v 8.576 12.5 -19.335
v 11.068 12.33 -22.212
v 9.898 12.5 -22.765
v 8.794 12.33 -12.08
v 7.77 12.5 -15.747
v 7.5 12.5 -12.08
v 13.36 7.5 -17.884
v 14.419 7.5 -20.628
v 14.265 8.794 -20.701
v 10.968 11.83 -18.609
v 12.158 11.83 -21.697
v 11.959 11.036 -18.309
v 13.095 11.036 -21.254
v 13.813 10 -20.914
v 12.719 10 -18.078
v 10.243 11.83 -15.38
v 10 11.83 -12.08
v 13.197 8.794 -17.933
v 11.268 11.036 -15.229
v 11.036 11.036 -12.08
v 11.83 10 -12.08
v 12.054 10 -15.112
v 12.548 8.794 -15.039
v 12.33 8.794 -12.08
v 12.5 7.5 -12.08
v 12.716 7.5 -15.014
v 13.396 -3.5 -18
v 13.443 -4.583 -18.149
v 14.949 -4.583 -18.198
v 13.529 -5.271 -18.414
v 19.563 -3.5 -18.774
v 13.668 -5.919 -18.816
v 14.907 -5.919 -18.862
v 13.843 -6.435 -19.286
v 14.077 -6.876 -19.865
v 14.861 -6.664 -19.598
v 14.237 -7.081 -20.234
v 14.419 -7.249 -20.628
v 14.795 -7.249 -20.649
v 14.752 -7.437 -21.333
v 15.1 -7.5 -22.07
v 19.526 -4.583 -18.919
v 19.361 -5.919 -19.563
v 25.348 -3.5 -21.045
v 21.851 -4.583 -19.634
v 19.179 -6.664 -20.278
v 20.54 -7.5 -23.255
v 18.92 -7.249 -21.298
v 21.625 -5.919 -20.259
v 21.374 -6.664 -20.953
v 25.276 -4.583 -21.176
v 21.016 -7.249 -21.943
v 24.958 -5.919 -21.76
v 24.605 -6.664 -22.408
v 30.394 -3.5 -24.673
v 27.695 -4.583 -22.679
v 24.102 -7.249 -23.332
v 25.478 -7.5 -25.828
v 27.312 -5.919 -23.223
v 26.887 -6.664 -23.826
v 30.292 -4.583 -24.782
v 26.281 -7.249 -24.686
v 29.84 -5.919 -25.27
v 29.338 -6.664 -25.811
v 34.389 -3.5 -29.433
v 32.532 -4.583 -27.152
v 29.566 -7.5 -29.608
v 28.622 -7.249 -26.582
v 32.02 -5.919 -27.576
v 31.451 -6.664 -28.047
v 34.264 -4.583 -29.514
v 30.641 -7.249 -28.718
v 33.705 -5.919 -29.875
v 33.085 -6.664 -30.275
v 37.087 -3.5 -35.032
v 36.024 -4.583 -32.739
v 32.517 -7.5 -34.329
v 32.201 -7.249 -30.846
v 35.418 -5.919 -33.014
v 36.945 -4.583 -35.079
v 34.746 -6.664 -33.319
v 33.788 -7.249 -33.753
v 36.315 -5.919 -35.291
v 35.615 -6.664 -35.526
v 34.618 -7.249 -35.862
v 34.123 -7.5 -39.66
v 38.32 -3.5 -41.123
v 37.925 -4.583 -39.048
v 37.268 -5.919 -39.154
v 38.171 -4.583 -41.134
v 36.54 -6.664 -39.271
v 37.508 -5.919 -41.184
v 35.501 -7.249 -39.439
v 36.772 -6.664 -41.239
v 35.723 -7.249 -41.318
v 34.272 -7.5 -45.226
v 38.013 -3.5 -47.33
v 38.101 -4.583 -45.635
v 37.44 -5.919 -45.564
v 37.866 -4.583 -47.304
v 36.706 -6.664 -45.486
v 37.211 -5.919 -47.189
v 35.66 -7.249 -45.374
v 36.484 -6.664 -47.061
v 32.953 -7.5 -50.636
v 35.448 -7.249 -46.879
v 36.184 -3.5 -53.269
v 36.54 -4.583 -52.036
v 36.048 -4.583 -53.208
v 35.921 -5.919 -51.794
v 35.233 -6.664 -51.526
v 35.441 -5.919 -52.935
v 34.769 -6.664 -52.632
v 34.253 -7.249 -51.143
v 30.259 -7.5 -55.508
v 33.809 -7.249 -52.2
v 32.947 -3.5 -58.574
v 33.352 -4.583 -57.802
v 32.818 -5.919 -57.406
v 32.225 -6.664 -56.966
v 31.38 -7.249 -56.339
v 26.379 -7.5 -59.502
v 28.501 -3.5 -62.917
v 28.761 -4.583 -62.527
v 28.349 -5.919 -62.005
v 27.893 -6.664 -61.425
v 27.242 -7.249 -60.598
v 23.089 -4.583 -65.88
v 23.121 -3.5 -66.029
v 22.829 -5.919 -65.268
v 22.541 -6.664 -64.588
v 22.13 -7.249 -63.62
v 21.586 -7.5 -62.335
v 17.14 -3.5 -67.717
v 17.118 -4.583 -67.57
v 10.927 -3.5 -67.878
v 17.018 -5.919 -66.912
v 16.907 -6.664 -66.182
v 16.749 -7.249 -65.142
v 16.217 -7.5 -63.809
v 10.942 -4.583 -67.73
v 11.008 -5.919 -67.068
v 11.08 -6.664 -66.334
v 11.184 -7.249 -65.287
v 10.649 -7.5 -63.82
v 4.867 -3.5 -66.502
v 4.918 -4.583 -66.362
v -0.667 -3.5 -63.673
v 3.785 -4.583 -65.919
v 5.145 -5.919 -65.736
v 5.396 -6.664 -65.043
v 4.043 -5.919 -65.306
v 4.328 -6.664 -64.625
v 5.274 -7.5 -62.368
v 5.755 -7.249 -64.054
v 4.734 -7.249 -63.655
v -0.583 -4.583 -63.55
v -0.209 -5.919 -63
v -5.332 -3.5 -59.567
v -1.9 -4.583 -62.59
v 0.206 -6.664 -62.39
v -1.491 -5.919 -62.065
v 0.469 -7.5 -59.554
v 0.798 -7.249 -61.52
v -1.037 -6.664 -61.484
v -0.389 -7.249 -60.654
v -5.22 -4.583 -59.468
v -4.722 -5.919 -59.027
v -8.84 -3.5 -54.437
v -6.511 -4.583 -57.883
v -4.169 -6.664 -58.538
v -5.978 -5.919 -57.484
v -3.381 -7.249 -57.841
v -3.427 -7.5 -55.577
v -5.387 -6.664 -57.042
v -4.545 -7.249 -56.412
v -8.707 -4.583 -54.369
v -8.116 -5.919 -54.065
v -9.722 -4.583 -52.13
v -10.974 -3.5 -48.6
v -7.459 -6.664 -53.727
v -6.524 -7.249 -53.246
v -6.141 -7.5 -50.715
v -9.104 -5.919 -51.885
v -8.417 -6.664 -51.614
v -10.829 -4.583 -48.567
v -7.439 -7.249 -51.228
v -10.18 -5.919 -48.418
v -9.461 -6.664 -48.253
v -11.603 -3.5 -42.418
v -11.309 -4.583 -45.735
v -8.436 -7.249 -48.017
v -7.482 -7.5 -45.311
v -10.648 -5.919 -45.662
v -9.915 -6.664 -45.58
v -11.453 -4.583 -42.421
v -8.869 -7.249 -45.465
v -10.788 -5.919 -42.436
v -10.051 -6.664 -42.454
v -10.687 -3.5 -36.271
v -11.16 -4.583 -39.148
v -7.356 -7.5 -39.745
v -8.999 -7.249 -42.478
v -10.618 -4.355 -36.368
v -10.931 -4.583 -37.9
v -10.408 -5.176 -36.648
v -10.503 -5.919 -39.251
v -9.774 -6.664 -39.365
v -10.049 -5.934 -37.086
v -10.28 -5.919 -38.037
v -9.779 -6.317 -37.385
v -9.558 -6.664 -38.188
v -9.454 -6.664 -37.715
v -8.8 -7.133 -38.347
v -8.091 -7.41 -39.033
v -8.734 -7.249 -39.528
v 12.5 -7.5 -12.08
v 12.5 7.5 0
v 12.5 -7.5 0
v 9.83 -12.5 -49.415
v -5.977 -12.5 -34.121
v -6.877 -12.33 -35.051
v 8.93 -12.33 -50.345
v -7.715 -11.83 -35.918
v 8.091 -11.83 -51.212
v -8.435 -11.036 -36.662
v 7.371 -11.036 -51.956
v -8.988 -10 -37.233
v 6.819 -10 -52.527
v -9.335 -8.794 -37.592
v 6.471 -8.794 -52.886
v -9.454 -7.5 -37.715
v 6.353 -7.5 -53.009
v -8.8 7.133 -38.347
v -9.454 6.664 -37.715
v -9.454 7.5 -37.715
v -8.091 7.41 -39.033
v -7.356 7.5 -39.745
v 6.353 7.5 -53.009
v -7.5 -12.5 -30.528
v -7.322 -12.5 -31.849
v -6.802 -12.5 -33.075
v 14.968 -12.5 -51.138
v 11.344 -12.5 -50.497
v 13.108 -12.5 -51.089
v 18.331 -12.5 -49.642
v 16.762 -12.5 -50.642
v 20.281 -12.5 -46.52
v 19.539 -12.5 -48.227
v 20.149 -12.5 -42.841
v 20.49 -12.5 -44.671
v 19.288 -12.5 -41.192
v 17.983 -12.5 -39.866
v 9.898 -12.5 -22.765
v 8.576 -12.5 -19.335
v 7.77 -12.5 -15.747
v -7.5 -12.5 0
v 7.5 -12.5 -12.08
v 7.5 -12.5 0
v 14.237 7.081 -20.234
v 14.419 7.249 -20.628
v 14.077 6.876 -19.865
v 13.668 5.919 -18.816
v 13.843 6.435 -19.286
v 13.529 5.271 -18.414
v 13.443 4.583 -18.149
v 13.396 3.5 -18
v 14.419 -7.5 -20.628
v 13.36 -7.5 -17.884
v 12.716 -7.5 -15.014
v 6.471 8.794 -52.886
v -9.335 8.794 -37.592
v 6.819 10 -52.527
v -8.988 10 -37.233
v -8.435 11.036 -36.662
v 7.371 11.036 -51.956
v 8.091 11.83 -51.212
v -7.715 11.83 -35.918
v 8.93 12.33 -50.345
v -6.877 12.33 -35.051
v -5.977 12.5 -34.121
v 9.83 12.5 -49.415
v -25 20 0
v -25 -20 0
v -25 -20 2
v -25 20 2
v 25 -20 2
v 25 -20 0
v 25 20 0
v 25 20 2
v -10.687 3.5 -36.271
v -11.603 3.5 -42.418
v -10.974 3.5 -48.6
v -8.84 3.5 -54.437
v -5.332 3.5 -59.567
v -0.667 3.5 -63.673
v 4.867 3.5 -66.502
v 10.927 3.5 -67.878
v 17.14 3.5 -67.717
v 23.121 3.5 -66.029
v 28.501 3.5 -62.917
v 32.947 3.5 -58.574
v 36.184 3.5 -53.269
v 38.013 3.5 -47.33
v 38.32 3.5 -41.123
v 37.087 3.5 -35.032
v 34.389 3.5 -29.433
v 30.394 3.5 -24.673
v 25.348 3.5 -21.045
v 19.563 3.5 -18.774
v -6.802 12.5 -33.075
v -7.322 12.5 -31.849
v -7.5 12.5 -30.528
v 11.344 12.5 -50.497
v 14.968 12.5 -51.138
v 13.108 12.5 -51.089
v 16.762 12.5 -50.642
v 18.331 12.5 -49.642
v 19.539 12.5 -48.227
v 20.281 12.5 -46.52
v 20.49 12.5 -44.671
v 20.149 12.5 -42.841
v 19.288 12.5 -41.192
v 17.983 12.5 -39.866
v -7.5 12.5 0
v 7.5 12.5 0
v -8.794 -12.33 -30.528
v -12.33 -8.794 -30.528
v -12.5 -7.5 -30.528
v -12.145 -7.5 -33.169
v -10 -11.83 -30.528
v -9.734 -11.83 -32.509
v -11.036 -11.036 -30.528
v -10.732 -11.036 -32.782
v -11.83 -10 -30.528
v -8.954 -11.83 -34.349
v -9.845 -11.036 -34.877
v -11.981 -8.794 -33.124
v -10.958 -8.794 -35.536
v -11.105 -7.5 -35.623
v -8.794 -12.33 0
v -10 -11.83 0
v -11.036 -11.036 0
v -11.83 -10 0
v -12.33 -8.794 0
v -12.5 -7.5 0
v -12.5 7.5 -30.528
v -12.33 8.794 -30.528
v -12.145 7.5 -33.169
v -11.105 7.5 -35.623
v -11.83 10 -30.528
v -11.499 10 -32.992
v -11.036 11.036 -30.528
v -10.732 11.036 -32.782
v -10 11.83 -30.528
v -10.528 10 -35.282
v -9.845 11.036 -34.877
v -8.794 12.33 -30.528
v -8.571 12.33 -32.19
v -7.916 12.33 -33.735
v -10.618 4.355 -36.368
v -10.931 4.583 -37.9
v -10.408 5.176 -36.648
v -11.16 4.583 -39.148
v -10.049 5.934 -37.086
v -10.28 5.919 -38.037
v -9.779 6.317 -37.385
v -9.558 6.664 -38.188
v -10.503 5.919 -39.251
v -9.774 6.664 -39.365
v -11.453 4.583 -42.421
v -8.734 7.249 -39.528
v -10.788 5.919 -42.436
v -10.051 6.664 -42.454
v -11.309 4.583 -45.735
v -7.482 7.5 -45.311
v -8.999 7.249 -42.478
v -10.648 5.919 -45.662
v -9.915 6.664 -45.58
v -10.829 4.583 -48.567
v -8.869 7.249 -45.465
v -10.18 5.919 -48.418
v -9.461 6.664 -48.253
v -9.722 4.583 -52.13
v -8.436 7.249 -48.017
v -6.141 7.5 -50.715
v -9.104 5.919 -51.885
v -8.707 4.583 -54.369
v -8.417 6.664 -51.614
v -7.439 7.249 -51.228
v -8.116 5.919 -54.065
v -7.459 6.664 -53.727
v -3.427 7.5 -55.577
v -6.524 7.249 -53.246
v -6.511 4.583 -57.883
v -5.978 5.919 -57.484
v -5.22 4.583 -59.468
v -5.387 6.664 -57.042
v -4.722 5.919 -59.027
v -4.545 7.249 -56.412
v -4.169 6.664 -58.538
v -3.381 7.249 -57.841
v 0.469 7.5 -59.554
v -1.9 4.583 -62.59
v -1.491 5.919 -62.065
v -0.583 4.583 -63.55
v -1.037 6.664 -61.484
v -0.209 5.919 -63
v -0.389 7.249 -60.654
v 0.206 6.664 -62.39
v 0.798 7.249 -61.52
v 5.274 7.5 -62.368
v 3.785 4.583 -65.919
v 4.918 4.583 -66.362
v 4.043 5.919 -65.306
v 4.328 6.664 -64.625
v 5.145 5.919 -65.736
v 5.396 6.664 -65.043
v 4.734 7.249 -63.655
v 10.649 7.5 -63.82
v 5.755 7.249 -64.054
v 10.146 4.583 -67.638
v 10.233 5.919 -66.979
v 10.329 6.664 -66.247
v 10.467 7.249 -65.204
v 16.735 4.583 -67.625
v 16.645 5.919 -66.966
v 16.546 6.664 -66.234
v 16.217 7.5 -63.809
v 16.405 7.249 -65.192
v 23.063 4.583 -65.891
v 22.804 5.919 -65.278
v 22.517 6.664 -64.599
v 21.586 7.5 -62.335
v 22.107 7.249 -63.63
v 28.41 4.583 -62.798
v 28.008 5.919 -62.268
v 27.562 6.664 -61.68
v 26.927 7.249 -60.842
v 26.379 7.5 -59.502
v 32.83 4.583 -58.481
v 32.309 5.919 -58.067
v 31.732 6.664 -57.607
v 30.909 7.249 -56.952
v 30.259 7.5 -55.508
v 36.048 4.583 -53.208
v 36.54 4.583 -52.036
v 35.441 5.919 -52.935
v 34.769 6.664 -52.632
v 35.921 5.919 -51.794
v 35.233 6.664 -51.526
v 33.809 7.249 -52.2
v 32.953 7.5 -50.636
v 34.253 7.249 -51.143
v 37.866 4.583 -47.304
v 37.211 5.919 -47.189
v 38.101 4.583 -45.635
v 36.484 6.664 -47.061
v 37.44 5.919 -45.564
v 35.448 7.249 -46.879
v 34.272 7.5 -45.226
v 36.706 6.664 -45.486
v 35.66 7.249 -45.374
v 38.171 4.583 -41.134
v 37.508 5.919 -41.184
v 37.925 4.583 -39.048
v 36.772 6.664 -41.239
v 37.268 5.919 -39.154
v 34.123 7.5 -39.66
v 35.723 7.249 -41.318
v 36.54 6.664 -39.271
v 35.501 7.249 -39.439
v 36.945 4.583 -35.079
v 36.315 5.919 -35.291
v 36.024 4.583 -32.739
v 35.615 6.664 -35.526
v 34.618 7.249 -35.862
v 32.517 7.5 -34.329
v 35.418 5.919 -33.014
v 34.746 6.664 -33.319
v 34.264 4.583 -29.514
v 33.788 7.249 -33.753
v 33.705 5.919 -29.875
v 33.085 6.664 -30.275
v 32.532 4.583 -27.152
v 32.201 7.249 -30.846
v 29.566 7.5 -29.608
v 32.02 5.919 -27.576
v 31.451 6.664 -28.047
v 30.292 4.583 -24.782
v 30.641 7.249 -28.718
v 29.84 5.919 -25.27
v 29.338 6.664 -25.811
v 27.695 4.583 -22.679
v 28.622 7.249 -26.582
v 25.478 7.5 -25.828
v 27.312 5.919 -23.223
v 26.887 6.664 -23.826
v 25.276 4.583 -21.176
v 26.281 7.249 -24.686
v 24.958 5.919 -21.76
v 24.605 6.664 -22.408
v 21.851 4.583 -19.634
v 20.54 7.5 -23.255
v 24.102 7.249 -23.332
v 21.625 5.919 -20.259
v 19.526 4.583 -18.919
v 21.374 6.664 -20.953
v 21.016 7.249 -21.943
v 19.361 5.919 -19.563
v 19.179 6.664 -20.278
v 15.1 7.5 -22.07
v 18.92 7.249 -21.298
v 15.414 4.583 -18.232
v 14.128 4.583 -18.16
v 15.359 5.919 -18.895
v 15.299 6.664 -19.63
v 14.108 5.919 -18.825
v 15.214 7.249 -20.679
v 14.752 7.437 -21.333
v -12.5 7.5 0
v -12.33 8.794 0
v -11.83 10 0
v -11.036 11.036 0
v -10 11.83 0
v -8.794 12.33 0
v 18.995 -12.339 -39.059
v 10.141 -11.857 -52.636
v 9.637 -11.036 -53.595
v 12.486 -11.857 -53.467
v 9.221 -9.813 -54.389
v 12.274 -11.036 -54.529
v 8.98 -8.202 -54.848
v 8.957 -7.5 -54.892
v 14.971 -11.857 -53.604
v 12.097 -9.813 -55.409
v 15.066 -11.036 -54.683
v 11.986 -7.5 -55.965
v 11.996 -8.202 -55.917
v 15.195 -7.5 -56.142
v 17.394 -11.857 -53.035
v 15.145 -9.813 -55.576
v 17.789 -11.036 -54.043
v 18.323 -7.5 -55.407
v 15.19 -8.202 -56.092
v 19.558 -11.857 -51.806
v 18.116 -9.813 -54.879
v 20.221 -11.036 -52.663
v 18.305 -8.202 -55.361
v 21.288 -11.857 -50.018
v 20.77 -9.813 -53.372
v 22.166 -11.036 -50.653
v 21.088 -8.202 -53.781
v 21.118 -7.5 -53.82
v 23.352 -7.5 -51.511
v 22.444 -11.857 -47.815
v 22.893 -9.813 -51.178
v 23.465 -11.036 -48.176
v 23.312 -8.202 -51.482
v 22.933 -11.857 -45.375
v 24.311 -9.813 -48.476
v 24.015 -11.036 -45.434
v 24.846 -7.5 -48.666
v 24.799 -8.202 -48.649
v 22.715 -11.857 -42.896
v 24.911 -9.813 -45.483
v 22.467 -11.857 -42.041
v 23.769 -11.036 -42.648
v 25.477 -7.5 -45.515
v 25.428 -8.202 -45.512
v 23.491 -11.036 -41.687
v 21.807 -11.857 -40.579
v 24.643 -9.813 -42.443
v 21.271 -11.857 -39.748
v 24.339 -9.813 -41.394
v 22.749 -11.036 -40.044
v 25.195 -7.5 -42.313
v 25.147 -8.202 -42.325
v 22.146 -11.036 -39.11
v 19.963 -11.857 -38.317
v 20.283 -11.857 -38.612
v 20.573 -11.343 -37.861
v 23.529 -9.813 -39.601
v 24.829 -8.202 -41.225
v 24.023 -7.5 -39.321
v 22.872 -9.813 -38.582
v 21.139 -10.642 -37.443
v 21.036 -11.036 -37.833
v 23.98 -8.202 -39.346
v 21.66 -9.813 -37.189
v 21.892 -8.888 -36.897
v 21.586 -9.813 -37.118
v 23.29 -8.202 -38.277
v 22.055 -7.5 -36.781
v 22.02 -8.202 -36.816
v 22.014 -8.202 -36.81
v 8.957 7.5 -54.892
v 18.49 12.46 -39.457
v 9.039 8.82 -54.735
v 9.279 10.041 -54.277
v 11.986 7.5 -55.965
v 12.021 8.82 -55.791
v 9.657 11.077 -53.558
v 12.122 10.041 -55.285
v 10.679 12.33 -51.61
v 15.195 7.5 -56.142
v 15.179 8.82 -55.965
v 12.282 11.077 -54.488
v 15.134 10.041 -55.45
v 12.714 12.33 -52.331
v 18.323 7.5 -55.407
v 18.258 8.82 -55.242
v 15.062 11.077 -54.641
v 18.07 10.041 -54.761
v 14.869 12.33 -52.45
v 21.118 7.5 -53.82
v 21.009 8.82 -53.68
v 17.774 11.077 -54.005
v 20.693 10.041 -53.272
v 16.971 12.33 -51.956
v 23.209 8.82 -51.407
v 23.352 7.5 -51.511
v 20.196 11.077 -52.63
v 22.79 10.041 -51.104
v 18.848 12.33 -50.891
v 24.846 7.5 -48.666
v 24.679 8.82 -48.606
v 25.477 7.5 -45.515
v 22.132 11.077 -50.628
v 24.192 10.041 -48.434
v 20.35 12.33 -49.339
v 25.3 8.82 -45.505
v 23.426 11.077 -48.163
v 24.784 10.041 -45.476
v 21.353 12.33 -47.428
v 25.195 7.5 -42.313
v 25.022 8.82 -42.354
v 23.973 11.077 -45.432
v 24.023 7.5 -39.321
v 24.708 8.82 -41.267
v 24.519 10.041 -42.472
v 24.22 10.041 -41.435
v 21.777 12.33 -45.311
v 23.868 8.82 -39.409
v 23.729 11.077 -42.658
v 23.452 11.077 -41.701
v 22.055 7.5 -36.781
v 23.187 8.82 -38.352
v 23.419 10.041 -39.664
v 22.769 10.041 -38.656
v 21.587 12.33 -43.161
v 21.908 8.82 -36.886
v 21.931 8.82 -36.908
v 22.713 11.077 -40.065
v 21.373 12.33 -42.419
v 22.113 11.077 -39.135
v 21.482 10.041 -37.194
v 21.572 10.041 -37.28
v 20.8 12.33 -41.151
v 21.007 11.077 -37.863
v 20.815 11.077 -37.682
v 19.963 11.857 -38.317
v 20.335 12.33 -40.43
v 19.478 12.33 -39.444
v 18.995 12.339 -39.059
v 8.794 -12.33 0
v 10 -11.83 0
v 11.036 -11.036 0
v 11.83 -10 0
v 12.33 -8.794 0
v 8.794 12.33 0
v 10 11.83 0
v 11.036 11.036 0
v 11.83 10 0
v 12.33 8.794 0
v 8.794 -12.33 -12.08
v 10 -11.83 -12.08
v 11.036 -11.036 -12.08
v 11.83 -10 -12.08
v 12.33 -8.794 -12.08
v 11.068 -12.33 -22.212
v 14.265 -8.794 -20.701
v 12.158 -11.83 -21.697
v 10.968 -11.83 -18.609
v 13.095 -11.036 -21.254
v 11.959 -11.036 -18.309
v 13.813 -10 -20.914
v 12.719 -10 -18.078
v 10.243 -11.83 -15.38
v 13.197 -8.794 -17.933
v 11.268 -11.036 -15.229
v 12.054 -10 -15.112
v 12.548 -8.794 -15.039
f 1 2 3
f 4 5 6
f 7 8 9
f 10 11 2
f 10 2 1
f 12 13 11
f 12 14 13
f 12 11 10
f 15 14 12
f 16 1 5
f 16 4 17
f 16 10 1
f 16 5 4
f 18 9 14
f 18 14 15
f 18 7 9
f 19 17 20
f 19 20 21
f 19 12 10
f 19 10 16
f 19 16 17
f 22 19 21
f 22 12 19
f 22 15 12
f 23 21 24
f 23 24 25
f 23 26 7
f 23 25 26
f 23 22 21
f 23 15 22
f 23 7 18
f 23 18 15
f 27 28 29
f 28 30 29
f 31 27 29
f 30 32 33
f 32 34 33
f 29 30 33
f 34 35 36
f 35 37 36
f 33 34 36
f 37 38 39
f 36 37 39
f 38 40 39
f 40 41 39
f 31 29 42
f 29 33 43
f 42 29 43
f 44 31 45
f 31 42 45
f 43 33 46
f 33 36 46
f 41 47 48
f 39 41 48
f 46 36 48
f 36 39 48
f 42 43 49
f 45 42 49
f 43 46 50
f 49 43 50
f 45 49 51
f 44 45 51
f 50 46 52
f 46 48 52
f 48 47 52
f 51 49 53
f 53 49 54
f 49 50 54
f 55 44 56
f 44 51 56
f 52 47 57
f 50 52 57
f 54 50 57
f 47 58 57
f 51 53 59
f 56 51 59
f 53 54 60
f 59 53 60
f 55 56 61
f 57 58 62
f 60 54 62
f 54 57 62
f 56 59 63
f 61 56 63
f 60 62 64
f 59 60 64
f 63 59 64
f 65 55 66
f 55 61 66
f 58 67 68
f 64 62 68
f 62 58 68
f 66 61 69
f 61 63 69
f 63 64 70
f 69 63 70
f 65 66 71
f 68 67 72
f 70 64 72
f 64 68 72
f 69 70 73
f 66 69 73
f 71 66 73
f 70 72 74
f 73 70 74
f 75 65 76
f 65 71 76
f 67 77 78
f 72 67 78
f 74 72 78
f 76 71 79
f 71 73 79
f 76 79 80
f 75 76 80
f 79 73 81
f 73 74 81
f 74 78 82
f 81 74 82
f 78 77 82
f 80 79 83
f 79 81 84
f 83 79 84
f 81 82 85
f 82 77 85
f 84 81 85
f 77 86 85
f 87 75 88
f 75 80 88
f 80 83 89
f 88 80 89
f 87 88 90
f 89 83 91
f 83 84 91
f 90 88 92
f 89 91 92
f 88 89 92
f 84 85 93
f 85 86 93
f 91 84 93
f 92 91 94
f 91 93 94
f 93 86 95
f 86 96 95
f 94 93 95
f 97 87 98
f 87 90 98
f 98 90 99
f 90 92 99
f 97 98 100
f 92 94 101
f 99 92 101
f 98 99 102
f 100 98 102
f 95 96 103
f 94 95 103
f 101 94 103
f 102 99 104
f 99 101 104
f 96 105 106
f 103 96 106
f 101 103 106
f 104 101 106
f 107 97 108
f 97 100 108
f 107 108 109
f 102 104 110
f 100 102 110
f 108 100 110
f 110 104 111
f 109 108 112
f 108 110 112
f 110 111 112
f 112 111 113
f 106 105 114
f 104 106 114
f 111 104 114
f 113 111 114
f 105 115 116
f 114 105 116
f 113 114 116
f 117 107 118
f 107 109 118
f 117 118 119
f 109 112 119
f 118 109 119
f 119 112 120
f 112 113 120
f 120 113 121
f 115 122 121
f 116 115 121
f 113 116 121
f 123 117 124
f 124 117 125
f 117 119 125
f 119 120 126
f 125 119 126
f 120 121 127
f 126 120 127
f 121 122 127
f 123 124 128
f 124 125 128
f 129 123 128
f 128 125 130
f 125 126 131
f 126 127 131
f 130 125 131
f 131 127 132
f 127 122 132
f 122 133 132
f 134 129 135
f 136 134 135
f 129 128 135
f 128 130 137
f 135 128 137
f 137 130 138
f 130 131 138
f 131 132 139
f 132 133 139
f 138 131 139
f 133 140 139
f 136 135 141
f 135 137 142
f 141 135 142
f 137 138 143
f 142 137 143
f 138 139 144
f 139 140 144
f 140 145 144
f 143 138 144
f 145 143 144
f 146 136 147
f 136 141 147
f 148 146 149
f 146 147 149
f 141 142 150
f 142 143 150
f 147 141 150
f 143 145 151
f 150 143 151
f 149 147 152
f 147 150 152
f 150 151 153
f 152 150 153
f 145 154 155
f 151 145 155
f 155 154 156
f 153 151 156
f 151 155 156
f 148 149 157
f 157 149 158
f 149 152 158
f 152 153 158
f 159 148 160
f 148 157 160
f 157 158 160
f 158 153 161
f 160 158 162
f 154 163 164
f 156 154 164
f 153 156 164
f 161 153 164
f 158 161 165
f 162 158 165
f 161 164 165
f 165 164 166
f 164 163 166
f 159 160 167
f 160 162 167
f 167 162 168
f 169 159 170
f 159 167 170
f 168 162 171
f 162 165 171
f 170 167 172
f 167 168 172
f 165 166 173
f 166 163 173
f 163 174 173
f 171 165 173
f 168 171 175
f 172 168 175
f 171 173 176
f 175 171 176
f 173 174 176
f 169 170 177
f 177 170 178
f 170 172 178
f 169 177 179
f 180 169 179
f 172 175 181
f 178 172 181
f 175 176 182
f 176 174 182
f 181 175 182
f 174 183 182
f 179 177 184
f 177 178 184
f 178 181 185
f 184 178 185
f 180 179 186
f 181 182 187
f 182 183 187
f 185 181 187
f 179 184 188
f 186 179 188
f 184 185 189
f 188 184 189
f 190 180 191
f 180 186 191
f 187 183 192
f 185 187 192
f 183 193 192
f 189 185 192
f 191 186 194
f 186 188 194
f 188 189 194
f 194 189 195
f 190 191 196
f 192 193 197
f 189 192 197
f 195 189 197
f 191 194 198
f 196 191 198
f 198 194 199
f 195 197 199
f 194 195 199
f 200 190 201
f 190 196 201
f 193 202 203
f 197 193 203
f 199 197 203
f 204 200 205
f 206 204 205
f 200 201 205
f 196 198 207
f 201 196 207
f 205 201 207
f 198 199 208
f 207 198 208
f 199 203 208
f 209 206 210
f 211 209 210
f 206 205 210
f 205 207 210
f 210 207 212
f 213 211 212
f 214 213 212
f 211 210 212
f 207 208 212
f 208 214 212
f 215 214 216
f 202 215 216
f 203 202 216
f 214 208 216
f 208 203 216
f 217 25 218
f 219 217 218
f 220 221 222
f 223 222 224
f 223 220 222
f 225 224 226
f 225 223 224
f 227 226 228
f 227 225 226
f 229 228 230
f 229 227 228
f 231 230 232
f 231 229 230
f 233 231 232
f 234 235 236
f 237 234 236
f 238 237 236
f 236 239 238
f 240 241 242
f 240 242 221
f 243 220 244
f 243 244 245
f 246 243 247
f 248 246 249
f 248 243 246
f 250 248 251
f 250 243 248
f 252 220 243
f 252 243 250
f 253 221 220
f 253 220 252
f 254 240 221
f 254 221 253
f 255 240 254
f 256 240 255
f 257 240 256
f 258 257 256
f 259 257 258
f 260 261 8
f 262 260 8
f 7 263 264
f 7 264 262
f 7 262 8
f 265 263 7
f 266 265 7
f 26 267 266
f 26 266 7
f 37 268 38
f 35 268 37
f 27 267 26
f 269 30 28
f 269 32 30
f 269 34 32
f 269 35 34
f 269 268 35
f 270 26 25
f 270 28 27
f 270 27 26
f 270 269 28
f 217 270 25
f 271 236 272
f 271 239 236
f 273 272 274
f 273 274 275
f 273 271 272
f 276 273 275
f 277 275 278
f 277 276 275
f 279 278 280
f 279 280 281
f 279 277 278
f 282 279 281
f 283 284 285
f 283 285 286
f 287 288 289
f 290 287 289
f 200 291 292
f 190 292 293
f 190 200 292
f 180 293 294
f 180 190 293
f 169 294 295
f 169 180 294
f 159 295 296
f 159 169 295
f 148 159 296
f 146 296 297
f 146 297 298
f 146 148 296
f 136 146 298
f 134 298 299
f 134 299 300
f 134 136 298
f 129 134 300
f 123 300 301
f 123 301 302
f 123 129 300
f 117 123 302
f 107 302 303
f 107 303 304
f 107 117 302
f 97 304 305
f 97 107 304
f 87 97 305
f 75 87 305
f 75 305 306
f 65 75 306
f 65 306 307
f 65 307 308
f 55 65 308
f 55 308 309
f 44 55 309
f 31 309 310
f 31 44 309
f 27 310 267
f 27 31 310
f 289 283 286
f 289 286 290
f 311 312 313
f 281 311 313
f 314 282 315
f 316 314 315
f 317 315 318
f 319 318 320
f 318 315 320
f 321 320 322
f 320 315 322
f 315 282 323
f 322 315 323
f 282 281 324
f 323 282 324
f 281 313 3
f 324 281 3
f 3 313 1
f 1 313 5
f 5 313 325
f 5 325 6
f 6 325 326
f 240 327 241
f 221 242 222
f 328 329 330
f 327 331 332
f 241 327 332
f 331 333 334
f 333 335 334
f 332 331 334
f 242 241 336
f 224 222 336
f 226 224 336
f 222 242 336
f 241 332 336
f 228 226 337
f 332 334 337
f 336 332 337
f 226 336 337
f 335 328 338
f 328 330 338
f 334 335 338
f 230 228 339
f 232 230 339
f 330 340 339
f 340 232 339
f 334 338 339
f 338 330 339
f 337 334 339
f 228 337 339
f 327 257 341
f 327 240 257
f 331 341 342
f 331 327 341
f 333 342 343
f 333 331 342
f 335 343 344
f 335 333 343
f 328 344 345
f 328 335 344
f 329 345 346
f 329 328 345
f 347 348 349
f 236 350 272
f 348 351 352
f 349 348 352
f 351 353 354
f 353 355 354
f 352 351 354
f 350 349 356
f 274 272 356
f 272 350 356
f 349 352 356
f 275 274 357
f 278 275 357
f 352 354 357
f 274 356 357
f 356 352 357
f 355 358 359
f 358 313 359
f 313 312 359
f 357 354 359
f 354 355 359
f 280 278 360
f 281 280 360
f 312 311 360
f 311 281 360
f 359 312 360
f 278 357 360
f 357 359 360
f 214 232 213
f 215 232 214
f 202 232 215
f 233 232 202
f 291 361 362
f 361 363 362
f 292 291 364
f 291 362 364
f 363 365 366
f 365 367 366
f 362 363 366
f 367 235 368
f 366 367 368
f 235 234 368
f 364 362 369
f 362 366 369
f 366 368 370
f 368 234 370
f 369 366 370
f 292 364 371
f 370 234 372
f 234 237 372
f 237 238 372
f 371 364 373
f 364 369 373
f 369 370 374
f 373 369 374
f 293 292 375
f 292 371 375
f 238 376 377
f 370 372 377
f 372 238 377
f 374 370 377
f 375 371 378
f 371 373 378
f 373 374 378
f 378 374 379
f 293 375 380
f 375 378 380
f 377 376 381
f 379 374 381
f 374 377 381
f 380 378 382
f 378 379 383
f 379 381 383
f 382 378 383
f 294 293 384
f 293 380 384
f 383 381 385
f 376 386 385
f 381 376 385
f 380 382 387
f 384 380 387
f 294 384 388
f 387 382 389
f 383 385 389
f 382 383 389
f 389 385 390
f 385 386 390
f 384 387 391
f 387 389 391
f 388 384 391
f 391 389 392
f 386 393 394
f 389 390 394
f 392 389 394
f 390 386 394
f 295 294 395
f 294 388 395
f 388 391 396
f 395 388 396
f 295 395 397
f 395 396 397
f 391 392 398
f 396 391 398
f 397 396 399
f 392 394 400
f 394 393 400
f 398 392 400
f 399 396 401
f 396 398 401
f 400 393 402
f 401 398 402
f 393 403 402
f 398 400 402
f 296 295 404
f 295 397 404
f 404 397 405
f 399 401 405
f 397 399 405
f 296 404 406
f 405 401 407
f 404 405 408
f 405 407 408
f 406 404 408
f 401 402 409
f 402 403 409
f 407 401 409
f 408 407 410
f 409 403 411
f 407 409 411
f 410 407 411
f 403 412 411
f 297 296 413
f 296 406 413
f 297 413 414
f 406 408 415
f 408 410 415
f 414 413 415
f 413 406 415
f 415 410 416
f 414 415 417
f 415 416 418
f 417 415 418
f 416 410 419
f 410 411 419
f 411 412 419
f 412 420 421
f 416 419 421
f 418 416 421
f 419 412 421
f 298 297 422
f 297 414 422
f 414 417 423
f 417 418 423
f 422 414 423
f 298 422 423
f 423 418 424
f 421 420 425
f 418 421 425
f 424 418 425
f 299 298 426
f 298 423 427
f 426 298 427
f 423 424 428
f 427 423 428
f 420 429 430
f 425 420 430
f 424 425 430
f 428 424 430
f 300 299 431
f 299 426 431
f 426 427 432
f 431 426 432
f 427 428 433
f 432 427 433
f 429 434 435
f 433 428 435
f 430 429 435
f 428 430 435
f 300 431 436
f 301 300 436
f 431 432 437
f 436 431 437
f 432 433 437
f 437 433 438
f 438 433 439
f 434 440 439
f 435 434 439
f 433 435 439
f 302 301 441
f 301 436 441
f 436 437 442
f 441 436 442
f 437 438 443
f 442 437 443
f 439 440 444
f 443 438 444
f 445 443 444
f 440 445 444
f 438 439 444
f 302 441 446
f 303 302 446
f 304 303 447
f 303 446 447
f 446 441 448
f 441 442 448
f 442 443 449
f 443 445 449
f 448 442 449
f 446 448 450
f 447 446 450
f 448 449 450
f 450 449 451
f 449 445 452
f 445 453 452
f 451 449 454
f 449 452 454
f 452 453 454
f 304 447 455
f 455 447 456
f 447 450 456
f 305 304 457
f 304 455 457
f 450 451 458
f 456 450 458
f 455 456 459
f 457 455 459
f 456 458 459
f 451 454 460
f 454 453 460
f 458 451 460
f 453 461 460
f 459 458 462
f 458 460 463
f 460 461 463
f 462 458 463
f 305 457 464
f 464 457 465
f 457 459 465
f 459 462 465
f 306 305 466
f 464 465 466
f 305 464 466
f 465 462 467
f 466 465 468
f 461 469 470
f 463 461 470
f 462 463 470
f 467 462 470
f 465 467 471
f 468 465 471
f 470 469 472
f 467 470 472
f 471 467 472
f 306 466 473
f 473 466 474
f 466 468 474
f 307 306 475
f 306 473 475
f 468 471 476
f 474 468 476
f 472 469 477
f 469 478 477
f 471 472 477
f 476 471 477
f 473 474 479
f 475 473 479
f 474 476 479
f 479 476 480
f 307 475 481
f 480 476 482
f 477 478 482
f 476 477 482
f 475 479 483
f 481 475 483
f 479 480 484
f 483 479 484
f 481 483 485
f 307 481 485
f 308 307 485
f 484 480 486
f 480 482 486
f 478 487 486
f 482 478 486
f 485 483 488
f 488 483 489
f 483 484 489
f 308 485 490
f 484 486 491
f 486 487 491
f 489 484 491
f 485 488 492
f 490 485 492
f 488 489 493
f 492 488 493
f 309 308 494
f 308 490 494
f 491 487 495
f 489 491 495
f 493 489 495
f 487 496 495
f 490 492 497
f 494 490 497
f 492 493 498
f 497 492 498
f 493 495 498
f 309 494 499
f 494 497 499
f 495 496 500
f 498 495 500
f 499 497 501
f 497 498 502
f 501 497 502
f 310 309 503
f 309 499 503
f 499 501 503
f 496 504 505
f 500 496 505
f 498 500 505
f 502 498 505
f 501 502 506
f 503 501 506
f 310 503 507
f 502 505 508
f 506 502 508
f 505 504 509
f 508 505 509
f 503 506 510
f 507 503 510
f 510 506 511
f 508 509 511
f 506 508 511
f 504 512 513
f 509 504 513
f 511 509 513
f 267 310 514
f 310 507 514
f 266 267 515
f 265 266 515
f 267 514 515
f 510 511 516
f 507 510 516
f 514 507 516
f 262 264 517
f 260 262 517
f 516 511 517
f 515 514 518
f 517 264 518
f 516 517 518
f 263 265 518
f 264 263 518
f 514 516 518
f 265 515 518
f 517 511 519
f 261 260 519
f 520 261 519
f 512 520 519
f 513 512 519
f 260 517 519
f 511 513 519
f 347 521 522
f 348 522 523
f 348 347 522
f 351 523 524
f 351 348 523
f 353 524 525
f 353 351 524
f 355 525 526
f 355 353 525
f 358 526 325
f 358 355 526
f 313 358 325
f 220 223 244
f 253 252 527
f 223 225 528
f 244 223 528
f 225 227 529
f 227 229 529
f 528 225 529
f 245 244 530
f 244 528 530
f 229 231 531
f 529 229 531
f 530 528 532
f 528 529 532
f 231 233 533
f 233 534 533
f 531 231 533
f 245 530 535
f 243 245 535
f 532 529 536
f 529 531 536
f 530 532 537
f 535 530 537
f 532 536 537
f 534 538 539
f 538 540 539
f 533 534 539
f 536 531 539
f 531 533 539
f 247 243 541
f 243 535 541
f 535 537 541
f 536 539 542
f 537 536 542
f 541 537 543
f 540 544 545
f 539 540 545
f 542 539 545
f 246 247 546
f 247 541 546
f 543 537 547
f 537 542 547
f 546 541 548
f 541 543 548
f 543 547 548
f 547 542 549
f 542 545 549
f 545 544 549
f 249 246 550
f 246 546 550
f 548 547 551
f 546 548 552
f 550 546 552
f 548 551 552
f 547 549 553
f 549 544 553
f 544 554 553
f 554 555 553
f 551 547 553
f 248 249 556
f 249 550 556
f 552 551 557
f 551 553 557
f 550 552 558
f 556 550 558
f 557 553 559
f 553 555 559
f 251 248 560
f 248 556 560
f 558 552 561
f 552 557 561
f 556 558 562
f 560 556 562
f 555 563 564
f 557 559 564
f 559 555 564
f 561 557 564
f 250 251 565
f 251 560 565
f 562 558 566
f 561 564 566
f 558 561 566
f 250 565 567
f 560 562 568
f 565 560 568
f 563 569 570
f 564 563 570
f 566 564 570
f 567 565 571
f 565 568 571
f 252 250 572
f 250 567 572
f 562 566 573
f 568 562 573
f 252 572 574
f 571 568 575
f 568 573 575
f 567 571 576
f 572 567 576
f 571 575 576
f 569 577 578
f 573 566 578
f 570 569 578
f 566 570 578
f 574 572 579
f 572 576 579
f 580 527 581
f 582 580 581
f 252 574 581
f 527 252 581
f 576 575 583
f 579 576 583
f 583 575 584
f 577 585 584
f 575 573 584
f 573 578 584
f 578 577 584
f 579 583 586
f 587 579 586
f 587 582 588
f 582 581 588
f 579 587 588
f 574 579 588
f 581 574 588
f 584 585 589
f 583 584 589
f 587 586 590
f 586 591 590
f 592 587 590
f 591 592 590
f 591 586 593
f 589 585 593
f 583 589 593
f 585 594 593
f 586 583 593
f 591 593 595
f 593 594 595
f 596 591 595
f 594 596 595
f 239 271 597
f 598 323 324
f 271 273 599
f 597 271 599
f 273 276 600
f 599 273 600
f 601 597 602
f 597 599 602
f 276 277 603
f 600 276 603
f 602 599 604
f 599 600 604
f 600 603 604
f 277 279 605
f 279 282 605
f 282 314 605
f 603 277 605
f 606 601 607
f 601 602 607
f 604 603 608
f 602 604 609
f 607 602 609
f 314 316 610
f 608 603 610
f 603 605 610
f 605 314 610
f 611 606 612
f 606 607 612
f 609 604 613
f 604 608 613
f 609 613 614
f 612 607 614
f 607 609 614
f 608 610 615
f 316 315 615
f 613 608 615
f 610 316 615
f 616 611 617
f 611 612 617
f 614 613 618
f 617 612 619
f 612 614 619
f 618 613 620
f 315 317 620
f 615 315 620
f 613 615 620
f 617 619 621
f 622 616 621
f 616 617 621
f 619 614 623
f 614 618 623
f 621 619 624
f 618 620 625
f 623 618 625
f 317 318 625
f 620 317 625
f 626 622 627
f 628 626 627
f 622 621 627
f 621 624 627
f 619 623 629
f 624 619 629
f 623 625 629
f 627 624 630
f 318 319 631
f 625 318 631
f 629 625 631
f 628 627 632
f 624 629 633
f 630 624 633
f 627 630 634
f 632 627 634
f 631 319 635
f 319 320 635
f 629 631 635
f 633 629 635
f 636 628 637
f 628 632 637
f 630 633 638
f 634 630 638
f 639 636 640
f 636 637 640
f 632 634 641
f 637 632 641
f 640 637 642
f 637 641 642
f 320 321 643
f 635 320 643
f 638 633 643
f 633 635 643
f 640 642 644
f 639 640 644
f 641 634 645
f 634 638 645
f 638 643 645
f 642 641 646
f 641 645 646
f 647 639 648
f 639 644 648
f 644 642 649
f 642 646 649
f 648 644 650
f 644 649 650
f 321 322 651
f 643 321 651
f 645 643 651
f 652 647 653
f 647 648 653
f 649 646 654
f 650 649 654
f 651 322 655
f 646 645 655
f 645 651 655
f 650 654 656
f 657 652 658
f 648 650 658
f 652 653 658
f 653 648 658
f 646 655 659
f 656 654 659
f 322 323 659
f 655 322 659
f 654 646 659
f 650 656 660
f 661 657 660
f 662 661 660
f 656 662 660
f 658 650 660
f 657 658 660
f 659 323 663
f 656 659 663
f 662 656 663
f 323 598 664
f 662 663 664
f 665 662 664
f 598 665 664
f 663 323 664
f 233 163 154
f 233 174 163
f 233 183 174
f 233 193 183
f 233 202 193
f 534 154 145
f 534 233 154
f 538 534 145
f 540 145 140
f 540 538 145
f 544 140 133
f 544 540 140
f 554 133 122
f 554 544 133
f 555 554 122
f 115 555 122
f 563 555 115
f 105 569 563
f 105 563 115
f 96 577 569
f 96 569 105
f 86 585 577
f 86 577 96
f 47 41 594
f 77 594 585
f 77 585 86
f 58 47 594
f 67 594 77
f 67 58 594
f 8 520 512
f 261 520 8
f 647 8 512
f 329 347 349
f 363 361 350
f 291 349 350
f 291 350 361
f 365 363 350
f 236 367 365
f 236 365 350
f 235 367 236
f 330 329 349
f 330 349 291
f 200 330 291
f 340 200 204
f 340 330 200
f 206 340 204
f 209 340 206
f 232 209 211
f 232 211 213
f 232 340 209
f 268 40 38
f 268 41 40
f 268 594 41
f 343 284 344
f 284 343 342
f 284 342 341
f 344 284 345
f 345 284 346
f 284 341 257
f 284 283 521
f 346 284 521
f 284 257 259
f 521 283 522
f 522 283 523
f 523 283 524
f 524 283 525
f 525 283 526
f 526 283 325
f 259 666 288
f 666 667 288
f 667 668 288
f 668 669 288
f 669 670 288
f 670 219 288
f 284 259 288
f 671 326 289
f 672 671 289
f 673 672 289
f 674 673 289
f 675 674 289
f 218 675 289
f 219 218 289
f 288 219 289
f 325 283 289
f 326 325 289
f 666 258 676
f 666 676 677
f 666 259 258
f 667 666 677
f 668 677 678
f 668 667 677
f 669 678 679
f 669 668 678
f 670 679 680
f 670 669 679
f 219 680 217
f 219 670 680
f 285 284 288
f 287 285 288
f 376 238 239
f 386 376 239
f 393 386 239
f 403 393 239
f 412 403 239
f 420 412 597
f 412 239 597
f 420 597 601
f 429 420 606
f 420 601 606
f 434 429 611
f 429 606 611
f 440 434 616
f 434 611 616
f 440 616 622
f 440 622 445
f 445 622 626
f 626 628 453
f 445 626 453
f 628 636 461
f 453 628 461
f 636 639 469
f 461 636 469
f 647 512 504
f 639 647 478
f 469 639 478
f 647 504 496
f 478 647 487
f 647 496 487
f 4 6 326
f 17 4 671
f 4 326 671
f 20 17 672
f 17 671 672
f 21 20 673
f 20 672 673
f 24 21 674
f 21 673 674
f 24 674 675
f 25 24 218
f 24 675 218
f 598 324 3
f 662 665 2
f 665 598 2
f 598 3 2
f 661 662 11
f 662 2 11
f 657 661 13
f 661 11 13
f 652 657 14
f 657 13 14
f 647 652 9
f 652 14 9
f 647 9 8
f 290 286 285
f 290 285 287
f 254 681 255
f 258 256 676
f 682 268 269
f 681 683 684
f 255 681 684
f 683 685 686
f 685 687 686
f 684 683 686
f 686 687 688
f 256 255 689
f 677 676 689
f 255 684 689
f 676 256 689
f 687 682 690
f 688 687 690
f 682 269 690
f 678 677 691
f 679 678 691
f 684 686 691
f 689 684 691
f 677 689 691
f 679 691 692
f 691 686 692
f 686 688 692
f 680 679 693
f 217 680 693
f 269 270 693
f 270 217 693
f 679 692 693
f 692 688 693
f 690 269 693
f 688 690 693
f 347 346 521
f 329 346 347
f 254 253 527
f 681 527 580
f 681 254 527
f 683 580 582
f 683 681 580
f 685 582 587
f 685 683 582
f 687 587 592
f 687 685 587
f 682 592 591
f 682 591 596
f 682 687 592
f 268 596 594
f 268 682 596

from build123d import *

# Parameters (mm, degrees)
F0_W     = 50
F0_H     = 40
F1_DEPTH = 2
F3_DEPTH = 12.5
F4_R     = 25
F5_DEPTH = 7.5
F6_R     = 4
F7_R     = 4.99999


# Not quite as in the source:
# - a fillet or chamfer is up to 0.001 mm smaller than in the source, because OpenCascade refuses the exact size


with BuildPart() as f1:
    # F0 (on Top) → F1 (new body)
    with BuildSketch(Plane.XY):
        Rectangle(F0_W, F0_H)
    extrude(amount=F1_DEPTH)

    # F2 (on Front) → F3 (join, symmetric)
    with BuildSketch(Plane.XZ):
        with BuildLine():
            Line((12.5, 0), (-12.5, 0))
            Line((-12.5, 0), (-12.5, -30.5279912201))
            ThreePointArc((-12.5, -30.5279912201), (-11.7069556163, -34.43080665), (-9.4536063441, -37.7146009084))
            Line((-9.4536063441, -37.7146009084), (6.3529476633, -53.0086768346))
            ThreePointArc((6.3529476633, -53.0086768346), (22.3177107814, -52.745608492), (22.0546424389, -36.7808453739))
            Line((22.0546424389, -36.7808453739), (14.4186308033, -20.6281161927))
            ThreePointArc((14.4186308033, -20.6281161927), (12.9855517125, -16.4605806119), (12.5, -12.0803628053))
            Line((12.5, -12.0803628053), (12.5, 0))
        make_face()
    extrude(amount=F3_DEPTH, both=True)

    # F4 (on Front) → F5 (join, symmetric)
    with BuildSketch(Plane.XZ):
        with Locations((13.390565291, -43)):
            Circle(F4_R)
    extrude(amount=F5_DEPTH, both=True)

    # F6
    f6_edges = [f1.edges().sort_by_distance(p)[0] for p in [
        (28.500684, -7.5, -62.916935),
        (28.500684, 7.5, -62.916935),
    ]]
    fillet(f6_edges, radius=F6_R)

    # F7 (radius 5 in the source; OpenCascade refuses exactly that, so slightly less here)
    f7_edges = [f1.edges().sort_by_distance(p)[0] for p in [
        (12.5, -12.5, -6.040181),
        (-12.5, -12.5, -15.263996),
        (-12.5, 12.5, -15.263996),
        (12.5, 12.5, -6.040181),
    ]]
    fillet(f7_edges, radius=F7_R)


solid = f1.part
